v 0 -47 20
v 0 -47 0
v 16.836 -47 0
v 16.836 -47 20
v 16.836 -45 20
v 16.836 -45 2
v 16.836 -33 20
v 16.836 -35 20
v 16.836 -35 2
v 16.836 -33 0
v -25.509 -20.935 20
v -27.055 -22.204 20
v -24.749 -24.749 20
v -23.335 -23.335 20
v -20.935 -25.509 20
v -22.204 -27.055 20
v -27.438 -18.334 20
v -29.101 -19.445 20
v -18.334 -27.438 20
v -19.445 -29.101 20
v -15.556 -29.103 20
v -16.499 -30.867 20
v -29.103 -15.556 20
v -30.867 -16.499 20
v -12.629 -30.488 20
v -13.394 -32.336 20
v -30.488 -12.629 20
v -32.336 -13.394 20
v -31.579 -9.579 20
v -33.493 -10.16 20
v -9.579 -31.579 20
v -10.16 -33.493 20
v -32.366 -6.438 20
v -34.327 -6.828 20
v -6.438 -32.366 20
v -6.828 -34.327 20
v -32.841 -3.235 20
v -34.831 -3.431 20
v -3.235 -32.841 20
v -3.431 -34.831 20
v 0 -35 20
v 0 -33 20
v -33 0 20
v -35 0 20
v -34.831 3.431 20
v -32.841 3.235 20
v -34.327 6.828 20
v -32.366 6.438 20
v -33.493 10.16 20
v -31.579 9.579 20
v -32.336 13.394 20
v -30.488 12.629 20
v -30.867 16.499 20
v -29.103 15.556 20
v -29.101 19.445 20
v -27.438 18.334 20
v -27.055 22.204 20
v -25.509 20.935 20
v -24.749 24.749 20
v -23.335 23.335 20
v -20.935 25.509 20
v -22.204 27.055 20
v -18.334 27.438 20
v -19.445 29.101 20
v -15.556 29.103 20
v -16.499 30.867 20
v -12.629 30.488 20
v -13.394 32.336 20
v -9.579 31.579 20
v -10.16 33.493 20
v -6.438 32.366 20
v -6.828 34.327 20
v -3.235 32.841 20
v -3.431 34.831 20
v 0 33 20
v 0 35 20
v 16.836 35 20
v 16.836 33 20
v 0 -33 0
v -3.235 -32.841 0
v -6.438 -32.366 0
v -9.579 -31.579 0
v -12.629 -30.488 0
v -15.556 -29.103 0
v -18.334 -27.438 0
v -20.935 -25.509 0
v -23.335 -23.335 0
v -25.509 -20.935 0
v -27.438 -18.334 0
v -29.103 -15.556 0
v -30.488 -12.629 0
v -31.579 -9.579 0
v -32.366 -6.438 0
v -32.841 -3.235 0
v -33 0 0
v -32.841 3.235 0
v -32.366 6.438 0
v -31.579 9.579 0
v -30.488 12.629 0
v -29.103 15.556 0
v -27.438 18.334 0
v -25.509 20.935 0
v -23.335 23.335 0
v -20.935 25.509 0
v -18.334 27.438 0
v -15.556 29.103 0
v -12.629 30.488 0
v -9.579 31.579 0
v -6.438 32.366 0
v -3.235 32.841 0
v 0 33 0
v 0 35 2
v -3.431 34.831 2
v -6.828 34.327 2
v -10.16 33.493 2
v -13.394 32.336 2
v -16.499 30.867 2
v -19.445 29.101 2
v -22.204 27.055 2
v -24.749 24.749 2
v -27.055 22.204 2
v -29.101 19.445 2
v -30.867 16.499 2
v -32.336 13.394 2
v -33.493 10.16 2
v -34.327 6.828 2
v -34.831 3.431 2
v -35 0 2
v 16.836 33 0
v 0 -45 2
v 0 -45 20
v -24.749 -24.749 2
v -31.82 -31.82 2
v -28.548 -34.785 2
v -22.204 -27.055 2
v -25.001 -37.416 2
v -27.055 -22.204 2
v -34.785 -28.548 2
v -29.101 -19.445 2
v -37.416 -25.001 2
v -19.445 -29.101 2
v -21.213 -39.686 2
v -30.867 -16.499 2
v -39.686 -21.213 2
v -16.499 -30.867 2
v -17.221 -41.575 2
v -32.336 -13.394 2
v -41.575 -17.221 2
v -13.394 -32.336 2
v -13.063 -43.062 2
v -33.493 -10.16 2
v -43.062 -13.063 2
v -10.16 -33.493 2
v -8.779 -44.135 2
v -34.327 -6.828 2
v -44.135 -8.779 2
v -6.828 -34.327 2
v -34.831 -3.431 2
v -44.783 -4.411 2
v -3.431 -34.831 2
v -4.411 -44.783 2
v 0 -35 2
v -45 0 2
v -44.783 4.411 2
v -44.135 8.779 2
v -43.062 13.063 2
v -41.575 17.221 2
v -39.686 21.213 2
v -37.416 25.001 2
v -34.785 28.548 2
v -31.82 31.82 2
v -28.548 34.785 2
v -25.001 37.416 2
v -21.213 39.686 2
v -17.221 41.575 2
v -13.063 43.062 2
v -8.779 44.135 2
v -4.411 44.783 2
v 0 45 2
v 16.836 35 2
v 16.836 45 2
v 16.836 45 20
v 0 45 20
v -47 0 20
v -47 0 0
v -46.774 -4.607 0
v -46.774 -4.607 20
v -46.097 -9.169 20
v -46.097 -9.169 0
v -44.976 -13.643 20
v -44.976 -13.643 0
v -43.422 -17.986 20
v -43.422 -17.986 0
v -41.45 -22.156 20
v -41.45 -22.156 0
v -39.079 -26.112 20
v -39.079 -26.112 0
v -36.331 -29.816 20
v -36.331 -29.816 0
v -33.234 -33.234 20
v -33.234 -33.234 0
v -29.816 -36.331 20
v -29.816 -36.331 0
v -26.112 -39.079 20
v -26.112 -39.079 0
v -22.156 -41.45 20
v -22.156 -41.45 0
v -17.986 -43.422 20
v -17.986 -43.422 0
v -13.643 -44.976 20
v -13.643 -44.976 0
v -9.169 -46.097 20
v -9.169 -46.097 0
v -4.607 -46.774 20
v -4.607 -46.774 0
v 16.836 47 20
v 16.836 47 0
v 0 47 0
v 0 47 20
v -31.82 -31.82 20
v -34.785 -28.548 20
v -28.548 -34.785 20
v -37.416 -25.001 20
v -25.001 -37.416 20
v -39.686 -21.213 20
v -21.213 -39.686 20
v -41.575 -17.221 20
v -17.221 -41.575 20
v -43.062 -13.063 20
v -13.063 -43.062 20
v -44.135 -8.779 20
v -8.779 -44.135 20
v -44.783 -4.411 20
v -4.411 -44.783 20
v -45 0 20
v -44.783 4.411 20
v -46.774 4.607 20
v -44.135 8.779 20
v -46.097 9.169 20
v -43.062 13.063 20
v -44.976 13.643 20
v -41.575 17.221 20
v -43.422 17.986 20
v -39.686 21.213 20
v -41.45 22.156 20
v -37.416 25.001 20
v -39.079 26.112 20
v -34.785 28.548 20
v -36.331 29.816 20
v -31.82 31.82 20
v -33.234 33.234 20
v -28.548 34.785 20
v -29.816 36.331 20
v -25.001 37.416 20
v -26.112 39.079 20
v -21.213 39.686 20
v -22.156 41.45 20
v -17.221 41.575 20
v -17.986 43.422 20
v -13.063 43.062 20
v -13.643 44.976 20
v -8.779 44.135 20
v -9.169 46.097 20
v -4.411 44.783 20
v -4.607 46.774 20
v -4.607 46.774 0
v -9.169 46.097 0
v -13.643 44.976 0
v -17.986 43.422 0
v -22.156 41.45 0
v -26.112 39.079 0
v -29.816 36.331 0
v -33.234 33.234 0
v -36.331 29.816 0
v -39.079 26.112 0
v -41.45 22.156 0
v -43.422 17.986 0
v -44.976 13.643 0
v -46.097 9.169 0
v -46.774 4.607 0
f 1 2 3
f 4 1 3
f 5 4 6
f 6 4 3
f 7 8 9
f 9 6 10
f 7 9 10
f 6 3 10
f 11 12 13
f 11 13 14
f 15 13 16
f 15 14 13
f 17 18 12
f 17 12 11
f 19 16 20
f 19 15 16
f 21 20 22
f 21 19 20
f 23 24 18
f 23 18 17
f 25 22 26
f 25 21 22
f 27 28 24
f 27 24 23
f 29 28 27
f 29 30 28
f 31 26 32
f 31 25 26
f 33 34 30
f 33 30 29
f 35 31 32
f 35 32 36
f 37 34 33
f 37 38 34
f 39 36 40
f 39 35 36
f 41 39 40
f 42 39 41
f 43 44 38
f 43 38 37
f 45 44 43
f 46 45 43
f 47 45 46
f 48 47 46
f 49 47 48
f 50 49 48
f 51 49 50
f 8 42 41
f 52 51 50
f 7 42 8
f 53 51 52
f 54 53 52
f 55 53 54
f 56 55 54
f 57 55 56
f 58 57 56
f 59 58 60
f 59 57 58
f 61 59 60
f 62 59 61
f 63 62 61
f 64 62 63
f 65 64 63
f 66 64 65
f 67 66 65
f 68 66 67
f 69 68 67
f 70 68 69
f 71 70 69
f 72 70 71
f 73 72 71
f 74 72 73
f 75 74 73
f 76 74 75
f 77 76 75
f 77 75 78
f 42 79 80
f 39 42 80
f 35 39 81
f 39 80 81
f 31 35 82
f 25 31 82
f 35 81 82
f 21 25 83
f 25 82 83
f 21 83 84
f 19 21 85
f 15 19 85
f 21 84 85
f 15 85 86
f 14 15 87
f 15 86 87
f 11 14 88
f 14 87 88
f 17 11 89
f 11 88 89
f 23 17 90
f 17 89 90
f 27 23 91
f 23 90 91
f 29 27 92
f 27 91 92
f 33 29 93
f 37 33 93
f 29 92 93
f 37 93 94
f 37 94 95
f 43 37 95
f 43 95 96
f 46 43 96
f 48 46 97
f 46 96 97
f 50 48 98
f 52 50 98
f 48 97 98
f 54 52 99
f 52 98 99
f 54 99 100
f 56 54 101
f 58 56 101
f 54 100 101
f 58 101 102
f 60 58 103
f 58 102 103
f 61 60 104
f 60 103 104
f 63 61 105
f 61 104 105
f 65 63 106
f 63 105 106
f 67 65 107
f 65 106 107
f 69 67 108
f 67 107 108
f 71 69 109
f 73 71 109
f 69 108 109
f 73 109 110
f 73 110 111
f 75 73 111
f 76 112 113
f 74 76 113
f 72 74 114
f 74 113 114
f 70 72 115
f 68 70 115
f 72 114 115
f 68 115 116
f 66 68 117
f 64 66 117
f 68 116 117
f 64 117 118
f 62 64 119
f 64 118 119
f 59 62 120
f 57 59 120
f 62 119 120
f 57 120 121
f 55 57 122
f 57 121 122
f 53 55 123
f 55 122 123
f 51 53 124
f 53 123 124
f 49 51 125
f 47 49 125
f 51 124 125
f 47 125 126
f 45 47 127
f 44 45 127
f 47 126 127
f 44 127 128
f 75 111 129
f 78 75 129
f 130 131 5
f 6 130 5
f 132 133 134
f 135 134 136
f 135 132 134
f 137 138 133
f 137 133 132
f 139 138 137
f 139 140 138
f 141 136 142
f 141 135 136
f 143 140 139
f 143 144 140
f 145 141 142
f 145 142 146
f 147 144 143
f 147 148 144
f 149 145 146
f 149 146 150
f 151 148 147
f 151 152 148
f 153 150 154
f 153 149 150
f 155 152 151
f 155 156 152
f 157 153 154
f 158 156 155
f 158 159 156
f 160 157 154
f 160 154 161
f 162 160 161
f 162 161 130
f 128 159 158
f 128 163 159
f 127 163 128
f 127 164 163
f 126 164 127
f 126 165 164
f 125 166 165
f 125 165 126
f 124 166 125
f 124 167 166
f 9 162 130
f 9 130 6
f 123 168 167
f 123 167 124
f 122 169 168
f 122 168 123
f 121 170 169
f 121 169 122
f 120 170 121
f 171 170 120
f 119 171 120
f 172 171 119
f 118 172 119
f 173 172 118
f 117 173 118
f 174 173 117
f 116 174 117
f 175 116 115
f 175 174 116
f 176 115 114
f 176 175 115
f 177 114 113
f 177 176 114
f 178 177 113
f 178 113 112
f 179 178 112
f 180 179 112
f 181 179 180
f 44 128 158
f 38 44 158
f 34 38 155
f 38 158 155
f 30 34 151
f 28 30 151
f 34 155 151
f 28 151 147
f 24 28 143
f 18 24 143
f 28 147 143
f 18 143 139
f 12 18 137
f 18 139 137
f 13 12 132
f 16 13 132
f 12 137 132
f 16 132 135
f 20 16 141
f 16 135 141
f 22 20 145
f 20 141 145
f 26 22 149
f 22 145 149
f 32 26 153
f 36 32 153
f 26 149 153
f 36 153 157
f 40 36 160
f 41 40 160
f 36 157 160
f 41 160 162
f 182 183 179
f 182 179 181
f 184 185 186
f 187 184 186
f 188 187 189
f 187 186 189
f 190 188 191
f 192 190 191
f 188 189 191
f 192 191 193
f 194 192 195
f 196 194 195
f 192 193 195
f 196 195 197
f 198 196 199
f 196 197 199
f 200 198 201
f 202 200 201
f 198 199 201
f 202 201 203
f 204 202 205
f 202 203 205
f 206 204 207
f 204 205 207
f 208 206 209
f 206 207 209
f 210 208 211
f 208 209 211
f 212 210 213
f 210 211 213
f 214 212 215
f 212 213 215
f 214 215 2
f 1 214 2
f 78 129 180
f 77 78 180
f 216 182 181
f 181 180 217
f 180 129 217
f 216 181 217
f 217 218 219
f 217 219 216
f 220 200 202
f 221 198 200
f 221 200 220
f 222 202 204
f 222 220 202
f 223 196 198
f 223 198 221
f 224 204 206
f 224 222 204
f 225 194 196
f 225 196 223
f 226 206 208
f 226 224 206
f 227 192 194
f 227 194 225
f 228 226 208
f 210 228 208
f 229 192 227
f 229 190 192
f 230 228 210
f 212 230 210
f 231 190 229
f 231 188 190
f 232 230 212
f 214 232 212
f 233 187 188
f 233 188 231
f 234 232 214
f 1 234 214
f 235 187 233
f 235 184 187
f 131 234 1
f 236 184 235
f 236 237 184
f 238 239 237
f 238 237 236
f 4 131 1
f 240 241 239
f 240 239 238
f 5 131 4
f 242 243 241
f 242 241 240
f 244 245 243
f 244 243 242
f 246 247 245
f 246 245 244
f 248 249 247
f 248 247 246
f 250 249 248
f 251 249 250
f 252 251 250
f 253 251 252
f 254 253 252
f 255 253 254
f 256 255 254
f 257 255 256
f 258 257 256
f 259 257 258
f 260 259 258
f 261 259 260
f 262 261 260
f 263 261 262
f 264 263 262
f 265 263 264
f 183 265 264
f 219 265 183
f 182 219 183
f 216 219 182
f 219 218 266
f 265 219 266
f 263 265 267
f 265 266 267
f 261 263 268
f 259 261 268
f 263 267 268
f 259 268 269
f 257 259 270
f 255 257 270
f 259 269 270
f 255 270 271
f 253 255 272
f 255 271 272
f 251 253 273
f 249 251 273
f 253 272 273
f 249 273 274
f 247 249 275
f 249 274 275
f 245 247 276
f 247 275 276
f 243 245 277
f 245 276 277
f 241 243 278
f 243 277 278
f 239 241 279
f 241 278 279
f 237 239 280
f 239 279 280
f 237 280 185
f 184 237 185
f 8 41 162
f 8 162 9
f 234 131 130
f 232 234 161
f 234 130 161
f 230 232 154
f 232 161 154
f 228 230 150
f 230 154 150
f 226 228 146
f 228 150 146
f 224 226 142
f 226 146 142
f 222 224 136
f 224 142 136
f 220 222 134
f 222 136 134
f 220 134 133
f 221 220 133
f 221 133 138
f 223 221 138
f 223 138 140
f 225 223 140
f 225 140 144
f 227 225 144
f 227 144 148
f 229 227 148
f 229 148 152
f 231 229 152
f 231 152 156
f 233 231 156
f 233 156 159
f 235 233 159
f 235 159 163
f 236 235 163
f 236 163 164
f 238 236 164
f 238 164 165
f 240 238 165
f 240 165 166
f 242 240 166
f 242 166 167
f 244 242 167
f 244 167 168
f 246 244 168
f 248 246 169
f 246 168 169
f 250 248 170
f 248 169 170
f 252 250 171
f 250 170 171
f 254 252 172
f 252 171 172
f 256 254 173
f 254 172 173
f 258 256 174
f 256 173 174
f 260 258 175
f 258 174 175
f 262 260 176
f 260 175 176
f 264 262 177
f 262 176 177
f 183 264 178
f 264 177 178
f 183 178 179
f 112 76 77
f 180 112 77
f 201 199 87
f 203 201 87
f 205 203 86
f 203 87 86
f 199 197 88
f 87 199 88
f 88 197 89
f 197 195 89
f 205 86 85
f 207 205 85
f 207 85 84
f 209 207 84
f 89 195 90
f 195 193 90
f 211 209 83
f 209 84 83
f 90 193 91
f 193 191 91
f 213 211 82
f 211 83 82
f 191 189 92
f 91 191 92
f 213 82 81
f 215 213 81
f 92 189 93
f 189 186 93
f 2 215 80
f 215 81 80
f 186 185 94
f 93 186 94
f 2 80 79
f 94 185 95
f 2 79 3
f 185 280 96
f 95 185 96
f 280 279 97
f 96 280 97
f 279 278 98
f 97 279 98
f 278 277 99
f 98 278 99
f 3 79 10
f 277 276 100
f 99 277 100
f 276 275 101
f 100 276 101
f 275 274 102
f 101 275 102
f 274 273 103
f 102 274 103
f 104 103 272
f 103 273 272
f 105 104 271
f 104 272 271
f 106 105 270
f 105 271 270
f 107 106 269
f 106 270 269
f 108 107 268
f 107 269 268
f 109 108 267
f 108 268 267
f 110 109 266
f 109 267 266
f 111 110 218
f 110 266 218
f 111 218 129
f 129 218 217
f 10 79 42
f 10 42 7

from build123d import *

# Parameters (mm, degrees)
F0_W     = 16.8362744153
F0_H     = 2
F1_DEPTH = 20
F0_H_2   = 10
F2_DEPTH = 2


with BuildPart() as f1:
    # F0 (on Top) → F1 (new body)
    with BuildSketch(Plane.XY):
        with BuildLine():
            Line((0, 33), (0, 35))
            ThreePointArc((0, 35), (-24.7487373415, 24.7487373415), (-35, 0))
            Line((-35, 0), (-33, 0))
            ThreePointArc((-33, 0), (-23.3345237792, 23.3345237792), (0, 33))
        make_face()
        with Locations((8.4181372076, 34)):
            Rectangle(F0_W, F0_H)
        with BuildLine():
            Line((-33, 0), (-35, 0))
            ThreePointArc((-35, 0), (-24.7487373415, -24.7487373415), (0, -35))
            Line((0, -35), (0, -33))
            ThreePointArc((0, -33), (-23.3345237792, -23.3345237792), (-33, 0))
        make_face()
        with Locations((8.4181372076, -34)):
            Rectangle(F0_W, F0_H)
    extrude(amount=F1_DEPTH)



with BuildPart() as f1b:
    # F0 (on Top) → F1, piece 2 (new body)
    with BuildSketch(Plane.XY):
        with BuildLine():
            ThreePointArc((-45, 0), (-31.8198051534, 31.8198051534), (0, 45))
            Line((0, 45), (0, 47))
            ThreePointArc((0, 47), (-33.2340187158, 33.2340187158), (-47, 0))
            Line((-47, 0), (-45, 0))
        make_face()
        with Locations((8.4181372076, 46)):
            Rectangle(F0_W, F0_H)
        with BuildLine():
            ThreePointArc((0, -45), (-31.8198051534, -31.8198051534), (-45, 0))
            Line((-45, 0), (-47, 0))
            ThreePointArc((-47, 0), (-33.2340187158, -33.2340187158), (0, -47))
            Line((0, -47), (0, -45))
        make_face()
        with Locations((8.4181372076, -46)):
            Rectangle(F0_W, F0_H)
    extrude(amount=F1_DEPTH)


with BuildPart() as f1_1:
    add(f1.part)

    add(f1b.part)  # F2 merges F1b
    # F0 (on Top) → F2 (join)
    with BuildSketch(Plane.XY):
        with BuildLine():
            ThreePointArc((0, -35), (-24.7487373415, -24.7487373415), (-35, 0))
            Line((-35, 0), (-45, 0))
            ThreePointArc((-45, 0), (-31.8198051534, -31.8198051534), (0, -45))
            Line((0, -45), (0, -35))
        make_face()
        with BuildLine():
            ThreePointArc((-35, 0), (-24.7487373415, 24.7487373415), (0, 35))
            Line((0, 35), (0, 45))
            ThreePointArc((0, 45), (-31.8198051534, 31.8198051534), (-45, 0))
            Line((-45, 0), (-35, 0))
        make_face()
        with Locations((8.4181372076, 40)):
            Rectangle(F0_W, F0_H_2)
        with Locations((8.4181372076, -40)):
            Rectangle(F0_W, F0_H_2)
    extrude(amount=F2_DEPTH)


solid = f1_1.part
